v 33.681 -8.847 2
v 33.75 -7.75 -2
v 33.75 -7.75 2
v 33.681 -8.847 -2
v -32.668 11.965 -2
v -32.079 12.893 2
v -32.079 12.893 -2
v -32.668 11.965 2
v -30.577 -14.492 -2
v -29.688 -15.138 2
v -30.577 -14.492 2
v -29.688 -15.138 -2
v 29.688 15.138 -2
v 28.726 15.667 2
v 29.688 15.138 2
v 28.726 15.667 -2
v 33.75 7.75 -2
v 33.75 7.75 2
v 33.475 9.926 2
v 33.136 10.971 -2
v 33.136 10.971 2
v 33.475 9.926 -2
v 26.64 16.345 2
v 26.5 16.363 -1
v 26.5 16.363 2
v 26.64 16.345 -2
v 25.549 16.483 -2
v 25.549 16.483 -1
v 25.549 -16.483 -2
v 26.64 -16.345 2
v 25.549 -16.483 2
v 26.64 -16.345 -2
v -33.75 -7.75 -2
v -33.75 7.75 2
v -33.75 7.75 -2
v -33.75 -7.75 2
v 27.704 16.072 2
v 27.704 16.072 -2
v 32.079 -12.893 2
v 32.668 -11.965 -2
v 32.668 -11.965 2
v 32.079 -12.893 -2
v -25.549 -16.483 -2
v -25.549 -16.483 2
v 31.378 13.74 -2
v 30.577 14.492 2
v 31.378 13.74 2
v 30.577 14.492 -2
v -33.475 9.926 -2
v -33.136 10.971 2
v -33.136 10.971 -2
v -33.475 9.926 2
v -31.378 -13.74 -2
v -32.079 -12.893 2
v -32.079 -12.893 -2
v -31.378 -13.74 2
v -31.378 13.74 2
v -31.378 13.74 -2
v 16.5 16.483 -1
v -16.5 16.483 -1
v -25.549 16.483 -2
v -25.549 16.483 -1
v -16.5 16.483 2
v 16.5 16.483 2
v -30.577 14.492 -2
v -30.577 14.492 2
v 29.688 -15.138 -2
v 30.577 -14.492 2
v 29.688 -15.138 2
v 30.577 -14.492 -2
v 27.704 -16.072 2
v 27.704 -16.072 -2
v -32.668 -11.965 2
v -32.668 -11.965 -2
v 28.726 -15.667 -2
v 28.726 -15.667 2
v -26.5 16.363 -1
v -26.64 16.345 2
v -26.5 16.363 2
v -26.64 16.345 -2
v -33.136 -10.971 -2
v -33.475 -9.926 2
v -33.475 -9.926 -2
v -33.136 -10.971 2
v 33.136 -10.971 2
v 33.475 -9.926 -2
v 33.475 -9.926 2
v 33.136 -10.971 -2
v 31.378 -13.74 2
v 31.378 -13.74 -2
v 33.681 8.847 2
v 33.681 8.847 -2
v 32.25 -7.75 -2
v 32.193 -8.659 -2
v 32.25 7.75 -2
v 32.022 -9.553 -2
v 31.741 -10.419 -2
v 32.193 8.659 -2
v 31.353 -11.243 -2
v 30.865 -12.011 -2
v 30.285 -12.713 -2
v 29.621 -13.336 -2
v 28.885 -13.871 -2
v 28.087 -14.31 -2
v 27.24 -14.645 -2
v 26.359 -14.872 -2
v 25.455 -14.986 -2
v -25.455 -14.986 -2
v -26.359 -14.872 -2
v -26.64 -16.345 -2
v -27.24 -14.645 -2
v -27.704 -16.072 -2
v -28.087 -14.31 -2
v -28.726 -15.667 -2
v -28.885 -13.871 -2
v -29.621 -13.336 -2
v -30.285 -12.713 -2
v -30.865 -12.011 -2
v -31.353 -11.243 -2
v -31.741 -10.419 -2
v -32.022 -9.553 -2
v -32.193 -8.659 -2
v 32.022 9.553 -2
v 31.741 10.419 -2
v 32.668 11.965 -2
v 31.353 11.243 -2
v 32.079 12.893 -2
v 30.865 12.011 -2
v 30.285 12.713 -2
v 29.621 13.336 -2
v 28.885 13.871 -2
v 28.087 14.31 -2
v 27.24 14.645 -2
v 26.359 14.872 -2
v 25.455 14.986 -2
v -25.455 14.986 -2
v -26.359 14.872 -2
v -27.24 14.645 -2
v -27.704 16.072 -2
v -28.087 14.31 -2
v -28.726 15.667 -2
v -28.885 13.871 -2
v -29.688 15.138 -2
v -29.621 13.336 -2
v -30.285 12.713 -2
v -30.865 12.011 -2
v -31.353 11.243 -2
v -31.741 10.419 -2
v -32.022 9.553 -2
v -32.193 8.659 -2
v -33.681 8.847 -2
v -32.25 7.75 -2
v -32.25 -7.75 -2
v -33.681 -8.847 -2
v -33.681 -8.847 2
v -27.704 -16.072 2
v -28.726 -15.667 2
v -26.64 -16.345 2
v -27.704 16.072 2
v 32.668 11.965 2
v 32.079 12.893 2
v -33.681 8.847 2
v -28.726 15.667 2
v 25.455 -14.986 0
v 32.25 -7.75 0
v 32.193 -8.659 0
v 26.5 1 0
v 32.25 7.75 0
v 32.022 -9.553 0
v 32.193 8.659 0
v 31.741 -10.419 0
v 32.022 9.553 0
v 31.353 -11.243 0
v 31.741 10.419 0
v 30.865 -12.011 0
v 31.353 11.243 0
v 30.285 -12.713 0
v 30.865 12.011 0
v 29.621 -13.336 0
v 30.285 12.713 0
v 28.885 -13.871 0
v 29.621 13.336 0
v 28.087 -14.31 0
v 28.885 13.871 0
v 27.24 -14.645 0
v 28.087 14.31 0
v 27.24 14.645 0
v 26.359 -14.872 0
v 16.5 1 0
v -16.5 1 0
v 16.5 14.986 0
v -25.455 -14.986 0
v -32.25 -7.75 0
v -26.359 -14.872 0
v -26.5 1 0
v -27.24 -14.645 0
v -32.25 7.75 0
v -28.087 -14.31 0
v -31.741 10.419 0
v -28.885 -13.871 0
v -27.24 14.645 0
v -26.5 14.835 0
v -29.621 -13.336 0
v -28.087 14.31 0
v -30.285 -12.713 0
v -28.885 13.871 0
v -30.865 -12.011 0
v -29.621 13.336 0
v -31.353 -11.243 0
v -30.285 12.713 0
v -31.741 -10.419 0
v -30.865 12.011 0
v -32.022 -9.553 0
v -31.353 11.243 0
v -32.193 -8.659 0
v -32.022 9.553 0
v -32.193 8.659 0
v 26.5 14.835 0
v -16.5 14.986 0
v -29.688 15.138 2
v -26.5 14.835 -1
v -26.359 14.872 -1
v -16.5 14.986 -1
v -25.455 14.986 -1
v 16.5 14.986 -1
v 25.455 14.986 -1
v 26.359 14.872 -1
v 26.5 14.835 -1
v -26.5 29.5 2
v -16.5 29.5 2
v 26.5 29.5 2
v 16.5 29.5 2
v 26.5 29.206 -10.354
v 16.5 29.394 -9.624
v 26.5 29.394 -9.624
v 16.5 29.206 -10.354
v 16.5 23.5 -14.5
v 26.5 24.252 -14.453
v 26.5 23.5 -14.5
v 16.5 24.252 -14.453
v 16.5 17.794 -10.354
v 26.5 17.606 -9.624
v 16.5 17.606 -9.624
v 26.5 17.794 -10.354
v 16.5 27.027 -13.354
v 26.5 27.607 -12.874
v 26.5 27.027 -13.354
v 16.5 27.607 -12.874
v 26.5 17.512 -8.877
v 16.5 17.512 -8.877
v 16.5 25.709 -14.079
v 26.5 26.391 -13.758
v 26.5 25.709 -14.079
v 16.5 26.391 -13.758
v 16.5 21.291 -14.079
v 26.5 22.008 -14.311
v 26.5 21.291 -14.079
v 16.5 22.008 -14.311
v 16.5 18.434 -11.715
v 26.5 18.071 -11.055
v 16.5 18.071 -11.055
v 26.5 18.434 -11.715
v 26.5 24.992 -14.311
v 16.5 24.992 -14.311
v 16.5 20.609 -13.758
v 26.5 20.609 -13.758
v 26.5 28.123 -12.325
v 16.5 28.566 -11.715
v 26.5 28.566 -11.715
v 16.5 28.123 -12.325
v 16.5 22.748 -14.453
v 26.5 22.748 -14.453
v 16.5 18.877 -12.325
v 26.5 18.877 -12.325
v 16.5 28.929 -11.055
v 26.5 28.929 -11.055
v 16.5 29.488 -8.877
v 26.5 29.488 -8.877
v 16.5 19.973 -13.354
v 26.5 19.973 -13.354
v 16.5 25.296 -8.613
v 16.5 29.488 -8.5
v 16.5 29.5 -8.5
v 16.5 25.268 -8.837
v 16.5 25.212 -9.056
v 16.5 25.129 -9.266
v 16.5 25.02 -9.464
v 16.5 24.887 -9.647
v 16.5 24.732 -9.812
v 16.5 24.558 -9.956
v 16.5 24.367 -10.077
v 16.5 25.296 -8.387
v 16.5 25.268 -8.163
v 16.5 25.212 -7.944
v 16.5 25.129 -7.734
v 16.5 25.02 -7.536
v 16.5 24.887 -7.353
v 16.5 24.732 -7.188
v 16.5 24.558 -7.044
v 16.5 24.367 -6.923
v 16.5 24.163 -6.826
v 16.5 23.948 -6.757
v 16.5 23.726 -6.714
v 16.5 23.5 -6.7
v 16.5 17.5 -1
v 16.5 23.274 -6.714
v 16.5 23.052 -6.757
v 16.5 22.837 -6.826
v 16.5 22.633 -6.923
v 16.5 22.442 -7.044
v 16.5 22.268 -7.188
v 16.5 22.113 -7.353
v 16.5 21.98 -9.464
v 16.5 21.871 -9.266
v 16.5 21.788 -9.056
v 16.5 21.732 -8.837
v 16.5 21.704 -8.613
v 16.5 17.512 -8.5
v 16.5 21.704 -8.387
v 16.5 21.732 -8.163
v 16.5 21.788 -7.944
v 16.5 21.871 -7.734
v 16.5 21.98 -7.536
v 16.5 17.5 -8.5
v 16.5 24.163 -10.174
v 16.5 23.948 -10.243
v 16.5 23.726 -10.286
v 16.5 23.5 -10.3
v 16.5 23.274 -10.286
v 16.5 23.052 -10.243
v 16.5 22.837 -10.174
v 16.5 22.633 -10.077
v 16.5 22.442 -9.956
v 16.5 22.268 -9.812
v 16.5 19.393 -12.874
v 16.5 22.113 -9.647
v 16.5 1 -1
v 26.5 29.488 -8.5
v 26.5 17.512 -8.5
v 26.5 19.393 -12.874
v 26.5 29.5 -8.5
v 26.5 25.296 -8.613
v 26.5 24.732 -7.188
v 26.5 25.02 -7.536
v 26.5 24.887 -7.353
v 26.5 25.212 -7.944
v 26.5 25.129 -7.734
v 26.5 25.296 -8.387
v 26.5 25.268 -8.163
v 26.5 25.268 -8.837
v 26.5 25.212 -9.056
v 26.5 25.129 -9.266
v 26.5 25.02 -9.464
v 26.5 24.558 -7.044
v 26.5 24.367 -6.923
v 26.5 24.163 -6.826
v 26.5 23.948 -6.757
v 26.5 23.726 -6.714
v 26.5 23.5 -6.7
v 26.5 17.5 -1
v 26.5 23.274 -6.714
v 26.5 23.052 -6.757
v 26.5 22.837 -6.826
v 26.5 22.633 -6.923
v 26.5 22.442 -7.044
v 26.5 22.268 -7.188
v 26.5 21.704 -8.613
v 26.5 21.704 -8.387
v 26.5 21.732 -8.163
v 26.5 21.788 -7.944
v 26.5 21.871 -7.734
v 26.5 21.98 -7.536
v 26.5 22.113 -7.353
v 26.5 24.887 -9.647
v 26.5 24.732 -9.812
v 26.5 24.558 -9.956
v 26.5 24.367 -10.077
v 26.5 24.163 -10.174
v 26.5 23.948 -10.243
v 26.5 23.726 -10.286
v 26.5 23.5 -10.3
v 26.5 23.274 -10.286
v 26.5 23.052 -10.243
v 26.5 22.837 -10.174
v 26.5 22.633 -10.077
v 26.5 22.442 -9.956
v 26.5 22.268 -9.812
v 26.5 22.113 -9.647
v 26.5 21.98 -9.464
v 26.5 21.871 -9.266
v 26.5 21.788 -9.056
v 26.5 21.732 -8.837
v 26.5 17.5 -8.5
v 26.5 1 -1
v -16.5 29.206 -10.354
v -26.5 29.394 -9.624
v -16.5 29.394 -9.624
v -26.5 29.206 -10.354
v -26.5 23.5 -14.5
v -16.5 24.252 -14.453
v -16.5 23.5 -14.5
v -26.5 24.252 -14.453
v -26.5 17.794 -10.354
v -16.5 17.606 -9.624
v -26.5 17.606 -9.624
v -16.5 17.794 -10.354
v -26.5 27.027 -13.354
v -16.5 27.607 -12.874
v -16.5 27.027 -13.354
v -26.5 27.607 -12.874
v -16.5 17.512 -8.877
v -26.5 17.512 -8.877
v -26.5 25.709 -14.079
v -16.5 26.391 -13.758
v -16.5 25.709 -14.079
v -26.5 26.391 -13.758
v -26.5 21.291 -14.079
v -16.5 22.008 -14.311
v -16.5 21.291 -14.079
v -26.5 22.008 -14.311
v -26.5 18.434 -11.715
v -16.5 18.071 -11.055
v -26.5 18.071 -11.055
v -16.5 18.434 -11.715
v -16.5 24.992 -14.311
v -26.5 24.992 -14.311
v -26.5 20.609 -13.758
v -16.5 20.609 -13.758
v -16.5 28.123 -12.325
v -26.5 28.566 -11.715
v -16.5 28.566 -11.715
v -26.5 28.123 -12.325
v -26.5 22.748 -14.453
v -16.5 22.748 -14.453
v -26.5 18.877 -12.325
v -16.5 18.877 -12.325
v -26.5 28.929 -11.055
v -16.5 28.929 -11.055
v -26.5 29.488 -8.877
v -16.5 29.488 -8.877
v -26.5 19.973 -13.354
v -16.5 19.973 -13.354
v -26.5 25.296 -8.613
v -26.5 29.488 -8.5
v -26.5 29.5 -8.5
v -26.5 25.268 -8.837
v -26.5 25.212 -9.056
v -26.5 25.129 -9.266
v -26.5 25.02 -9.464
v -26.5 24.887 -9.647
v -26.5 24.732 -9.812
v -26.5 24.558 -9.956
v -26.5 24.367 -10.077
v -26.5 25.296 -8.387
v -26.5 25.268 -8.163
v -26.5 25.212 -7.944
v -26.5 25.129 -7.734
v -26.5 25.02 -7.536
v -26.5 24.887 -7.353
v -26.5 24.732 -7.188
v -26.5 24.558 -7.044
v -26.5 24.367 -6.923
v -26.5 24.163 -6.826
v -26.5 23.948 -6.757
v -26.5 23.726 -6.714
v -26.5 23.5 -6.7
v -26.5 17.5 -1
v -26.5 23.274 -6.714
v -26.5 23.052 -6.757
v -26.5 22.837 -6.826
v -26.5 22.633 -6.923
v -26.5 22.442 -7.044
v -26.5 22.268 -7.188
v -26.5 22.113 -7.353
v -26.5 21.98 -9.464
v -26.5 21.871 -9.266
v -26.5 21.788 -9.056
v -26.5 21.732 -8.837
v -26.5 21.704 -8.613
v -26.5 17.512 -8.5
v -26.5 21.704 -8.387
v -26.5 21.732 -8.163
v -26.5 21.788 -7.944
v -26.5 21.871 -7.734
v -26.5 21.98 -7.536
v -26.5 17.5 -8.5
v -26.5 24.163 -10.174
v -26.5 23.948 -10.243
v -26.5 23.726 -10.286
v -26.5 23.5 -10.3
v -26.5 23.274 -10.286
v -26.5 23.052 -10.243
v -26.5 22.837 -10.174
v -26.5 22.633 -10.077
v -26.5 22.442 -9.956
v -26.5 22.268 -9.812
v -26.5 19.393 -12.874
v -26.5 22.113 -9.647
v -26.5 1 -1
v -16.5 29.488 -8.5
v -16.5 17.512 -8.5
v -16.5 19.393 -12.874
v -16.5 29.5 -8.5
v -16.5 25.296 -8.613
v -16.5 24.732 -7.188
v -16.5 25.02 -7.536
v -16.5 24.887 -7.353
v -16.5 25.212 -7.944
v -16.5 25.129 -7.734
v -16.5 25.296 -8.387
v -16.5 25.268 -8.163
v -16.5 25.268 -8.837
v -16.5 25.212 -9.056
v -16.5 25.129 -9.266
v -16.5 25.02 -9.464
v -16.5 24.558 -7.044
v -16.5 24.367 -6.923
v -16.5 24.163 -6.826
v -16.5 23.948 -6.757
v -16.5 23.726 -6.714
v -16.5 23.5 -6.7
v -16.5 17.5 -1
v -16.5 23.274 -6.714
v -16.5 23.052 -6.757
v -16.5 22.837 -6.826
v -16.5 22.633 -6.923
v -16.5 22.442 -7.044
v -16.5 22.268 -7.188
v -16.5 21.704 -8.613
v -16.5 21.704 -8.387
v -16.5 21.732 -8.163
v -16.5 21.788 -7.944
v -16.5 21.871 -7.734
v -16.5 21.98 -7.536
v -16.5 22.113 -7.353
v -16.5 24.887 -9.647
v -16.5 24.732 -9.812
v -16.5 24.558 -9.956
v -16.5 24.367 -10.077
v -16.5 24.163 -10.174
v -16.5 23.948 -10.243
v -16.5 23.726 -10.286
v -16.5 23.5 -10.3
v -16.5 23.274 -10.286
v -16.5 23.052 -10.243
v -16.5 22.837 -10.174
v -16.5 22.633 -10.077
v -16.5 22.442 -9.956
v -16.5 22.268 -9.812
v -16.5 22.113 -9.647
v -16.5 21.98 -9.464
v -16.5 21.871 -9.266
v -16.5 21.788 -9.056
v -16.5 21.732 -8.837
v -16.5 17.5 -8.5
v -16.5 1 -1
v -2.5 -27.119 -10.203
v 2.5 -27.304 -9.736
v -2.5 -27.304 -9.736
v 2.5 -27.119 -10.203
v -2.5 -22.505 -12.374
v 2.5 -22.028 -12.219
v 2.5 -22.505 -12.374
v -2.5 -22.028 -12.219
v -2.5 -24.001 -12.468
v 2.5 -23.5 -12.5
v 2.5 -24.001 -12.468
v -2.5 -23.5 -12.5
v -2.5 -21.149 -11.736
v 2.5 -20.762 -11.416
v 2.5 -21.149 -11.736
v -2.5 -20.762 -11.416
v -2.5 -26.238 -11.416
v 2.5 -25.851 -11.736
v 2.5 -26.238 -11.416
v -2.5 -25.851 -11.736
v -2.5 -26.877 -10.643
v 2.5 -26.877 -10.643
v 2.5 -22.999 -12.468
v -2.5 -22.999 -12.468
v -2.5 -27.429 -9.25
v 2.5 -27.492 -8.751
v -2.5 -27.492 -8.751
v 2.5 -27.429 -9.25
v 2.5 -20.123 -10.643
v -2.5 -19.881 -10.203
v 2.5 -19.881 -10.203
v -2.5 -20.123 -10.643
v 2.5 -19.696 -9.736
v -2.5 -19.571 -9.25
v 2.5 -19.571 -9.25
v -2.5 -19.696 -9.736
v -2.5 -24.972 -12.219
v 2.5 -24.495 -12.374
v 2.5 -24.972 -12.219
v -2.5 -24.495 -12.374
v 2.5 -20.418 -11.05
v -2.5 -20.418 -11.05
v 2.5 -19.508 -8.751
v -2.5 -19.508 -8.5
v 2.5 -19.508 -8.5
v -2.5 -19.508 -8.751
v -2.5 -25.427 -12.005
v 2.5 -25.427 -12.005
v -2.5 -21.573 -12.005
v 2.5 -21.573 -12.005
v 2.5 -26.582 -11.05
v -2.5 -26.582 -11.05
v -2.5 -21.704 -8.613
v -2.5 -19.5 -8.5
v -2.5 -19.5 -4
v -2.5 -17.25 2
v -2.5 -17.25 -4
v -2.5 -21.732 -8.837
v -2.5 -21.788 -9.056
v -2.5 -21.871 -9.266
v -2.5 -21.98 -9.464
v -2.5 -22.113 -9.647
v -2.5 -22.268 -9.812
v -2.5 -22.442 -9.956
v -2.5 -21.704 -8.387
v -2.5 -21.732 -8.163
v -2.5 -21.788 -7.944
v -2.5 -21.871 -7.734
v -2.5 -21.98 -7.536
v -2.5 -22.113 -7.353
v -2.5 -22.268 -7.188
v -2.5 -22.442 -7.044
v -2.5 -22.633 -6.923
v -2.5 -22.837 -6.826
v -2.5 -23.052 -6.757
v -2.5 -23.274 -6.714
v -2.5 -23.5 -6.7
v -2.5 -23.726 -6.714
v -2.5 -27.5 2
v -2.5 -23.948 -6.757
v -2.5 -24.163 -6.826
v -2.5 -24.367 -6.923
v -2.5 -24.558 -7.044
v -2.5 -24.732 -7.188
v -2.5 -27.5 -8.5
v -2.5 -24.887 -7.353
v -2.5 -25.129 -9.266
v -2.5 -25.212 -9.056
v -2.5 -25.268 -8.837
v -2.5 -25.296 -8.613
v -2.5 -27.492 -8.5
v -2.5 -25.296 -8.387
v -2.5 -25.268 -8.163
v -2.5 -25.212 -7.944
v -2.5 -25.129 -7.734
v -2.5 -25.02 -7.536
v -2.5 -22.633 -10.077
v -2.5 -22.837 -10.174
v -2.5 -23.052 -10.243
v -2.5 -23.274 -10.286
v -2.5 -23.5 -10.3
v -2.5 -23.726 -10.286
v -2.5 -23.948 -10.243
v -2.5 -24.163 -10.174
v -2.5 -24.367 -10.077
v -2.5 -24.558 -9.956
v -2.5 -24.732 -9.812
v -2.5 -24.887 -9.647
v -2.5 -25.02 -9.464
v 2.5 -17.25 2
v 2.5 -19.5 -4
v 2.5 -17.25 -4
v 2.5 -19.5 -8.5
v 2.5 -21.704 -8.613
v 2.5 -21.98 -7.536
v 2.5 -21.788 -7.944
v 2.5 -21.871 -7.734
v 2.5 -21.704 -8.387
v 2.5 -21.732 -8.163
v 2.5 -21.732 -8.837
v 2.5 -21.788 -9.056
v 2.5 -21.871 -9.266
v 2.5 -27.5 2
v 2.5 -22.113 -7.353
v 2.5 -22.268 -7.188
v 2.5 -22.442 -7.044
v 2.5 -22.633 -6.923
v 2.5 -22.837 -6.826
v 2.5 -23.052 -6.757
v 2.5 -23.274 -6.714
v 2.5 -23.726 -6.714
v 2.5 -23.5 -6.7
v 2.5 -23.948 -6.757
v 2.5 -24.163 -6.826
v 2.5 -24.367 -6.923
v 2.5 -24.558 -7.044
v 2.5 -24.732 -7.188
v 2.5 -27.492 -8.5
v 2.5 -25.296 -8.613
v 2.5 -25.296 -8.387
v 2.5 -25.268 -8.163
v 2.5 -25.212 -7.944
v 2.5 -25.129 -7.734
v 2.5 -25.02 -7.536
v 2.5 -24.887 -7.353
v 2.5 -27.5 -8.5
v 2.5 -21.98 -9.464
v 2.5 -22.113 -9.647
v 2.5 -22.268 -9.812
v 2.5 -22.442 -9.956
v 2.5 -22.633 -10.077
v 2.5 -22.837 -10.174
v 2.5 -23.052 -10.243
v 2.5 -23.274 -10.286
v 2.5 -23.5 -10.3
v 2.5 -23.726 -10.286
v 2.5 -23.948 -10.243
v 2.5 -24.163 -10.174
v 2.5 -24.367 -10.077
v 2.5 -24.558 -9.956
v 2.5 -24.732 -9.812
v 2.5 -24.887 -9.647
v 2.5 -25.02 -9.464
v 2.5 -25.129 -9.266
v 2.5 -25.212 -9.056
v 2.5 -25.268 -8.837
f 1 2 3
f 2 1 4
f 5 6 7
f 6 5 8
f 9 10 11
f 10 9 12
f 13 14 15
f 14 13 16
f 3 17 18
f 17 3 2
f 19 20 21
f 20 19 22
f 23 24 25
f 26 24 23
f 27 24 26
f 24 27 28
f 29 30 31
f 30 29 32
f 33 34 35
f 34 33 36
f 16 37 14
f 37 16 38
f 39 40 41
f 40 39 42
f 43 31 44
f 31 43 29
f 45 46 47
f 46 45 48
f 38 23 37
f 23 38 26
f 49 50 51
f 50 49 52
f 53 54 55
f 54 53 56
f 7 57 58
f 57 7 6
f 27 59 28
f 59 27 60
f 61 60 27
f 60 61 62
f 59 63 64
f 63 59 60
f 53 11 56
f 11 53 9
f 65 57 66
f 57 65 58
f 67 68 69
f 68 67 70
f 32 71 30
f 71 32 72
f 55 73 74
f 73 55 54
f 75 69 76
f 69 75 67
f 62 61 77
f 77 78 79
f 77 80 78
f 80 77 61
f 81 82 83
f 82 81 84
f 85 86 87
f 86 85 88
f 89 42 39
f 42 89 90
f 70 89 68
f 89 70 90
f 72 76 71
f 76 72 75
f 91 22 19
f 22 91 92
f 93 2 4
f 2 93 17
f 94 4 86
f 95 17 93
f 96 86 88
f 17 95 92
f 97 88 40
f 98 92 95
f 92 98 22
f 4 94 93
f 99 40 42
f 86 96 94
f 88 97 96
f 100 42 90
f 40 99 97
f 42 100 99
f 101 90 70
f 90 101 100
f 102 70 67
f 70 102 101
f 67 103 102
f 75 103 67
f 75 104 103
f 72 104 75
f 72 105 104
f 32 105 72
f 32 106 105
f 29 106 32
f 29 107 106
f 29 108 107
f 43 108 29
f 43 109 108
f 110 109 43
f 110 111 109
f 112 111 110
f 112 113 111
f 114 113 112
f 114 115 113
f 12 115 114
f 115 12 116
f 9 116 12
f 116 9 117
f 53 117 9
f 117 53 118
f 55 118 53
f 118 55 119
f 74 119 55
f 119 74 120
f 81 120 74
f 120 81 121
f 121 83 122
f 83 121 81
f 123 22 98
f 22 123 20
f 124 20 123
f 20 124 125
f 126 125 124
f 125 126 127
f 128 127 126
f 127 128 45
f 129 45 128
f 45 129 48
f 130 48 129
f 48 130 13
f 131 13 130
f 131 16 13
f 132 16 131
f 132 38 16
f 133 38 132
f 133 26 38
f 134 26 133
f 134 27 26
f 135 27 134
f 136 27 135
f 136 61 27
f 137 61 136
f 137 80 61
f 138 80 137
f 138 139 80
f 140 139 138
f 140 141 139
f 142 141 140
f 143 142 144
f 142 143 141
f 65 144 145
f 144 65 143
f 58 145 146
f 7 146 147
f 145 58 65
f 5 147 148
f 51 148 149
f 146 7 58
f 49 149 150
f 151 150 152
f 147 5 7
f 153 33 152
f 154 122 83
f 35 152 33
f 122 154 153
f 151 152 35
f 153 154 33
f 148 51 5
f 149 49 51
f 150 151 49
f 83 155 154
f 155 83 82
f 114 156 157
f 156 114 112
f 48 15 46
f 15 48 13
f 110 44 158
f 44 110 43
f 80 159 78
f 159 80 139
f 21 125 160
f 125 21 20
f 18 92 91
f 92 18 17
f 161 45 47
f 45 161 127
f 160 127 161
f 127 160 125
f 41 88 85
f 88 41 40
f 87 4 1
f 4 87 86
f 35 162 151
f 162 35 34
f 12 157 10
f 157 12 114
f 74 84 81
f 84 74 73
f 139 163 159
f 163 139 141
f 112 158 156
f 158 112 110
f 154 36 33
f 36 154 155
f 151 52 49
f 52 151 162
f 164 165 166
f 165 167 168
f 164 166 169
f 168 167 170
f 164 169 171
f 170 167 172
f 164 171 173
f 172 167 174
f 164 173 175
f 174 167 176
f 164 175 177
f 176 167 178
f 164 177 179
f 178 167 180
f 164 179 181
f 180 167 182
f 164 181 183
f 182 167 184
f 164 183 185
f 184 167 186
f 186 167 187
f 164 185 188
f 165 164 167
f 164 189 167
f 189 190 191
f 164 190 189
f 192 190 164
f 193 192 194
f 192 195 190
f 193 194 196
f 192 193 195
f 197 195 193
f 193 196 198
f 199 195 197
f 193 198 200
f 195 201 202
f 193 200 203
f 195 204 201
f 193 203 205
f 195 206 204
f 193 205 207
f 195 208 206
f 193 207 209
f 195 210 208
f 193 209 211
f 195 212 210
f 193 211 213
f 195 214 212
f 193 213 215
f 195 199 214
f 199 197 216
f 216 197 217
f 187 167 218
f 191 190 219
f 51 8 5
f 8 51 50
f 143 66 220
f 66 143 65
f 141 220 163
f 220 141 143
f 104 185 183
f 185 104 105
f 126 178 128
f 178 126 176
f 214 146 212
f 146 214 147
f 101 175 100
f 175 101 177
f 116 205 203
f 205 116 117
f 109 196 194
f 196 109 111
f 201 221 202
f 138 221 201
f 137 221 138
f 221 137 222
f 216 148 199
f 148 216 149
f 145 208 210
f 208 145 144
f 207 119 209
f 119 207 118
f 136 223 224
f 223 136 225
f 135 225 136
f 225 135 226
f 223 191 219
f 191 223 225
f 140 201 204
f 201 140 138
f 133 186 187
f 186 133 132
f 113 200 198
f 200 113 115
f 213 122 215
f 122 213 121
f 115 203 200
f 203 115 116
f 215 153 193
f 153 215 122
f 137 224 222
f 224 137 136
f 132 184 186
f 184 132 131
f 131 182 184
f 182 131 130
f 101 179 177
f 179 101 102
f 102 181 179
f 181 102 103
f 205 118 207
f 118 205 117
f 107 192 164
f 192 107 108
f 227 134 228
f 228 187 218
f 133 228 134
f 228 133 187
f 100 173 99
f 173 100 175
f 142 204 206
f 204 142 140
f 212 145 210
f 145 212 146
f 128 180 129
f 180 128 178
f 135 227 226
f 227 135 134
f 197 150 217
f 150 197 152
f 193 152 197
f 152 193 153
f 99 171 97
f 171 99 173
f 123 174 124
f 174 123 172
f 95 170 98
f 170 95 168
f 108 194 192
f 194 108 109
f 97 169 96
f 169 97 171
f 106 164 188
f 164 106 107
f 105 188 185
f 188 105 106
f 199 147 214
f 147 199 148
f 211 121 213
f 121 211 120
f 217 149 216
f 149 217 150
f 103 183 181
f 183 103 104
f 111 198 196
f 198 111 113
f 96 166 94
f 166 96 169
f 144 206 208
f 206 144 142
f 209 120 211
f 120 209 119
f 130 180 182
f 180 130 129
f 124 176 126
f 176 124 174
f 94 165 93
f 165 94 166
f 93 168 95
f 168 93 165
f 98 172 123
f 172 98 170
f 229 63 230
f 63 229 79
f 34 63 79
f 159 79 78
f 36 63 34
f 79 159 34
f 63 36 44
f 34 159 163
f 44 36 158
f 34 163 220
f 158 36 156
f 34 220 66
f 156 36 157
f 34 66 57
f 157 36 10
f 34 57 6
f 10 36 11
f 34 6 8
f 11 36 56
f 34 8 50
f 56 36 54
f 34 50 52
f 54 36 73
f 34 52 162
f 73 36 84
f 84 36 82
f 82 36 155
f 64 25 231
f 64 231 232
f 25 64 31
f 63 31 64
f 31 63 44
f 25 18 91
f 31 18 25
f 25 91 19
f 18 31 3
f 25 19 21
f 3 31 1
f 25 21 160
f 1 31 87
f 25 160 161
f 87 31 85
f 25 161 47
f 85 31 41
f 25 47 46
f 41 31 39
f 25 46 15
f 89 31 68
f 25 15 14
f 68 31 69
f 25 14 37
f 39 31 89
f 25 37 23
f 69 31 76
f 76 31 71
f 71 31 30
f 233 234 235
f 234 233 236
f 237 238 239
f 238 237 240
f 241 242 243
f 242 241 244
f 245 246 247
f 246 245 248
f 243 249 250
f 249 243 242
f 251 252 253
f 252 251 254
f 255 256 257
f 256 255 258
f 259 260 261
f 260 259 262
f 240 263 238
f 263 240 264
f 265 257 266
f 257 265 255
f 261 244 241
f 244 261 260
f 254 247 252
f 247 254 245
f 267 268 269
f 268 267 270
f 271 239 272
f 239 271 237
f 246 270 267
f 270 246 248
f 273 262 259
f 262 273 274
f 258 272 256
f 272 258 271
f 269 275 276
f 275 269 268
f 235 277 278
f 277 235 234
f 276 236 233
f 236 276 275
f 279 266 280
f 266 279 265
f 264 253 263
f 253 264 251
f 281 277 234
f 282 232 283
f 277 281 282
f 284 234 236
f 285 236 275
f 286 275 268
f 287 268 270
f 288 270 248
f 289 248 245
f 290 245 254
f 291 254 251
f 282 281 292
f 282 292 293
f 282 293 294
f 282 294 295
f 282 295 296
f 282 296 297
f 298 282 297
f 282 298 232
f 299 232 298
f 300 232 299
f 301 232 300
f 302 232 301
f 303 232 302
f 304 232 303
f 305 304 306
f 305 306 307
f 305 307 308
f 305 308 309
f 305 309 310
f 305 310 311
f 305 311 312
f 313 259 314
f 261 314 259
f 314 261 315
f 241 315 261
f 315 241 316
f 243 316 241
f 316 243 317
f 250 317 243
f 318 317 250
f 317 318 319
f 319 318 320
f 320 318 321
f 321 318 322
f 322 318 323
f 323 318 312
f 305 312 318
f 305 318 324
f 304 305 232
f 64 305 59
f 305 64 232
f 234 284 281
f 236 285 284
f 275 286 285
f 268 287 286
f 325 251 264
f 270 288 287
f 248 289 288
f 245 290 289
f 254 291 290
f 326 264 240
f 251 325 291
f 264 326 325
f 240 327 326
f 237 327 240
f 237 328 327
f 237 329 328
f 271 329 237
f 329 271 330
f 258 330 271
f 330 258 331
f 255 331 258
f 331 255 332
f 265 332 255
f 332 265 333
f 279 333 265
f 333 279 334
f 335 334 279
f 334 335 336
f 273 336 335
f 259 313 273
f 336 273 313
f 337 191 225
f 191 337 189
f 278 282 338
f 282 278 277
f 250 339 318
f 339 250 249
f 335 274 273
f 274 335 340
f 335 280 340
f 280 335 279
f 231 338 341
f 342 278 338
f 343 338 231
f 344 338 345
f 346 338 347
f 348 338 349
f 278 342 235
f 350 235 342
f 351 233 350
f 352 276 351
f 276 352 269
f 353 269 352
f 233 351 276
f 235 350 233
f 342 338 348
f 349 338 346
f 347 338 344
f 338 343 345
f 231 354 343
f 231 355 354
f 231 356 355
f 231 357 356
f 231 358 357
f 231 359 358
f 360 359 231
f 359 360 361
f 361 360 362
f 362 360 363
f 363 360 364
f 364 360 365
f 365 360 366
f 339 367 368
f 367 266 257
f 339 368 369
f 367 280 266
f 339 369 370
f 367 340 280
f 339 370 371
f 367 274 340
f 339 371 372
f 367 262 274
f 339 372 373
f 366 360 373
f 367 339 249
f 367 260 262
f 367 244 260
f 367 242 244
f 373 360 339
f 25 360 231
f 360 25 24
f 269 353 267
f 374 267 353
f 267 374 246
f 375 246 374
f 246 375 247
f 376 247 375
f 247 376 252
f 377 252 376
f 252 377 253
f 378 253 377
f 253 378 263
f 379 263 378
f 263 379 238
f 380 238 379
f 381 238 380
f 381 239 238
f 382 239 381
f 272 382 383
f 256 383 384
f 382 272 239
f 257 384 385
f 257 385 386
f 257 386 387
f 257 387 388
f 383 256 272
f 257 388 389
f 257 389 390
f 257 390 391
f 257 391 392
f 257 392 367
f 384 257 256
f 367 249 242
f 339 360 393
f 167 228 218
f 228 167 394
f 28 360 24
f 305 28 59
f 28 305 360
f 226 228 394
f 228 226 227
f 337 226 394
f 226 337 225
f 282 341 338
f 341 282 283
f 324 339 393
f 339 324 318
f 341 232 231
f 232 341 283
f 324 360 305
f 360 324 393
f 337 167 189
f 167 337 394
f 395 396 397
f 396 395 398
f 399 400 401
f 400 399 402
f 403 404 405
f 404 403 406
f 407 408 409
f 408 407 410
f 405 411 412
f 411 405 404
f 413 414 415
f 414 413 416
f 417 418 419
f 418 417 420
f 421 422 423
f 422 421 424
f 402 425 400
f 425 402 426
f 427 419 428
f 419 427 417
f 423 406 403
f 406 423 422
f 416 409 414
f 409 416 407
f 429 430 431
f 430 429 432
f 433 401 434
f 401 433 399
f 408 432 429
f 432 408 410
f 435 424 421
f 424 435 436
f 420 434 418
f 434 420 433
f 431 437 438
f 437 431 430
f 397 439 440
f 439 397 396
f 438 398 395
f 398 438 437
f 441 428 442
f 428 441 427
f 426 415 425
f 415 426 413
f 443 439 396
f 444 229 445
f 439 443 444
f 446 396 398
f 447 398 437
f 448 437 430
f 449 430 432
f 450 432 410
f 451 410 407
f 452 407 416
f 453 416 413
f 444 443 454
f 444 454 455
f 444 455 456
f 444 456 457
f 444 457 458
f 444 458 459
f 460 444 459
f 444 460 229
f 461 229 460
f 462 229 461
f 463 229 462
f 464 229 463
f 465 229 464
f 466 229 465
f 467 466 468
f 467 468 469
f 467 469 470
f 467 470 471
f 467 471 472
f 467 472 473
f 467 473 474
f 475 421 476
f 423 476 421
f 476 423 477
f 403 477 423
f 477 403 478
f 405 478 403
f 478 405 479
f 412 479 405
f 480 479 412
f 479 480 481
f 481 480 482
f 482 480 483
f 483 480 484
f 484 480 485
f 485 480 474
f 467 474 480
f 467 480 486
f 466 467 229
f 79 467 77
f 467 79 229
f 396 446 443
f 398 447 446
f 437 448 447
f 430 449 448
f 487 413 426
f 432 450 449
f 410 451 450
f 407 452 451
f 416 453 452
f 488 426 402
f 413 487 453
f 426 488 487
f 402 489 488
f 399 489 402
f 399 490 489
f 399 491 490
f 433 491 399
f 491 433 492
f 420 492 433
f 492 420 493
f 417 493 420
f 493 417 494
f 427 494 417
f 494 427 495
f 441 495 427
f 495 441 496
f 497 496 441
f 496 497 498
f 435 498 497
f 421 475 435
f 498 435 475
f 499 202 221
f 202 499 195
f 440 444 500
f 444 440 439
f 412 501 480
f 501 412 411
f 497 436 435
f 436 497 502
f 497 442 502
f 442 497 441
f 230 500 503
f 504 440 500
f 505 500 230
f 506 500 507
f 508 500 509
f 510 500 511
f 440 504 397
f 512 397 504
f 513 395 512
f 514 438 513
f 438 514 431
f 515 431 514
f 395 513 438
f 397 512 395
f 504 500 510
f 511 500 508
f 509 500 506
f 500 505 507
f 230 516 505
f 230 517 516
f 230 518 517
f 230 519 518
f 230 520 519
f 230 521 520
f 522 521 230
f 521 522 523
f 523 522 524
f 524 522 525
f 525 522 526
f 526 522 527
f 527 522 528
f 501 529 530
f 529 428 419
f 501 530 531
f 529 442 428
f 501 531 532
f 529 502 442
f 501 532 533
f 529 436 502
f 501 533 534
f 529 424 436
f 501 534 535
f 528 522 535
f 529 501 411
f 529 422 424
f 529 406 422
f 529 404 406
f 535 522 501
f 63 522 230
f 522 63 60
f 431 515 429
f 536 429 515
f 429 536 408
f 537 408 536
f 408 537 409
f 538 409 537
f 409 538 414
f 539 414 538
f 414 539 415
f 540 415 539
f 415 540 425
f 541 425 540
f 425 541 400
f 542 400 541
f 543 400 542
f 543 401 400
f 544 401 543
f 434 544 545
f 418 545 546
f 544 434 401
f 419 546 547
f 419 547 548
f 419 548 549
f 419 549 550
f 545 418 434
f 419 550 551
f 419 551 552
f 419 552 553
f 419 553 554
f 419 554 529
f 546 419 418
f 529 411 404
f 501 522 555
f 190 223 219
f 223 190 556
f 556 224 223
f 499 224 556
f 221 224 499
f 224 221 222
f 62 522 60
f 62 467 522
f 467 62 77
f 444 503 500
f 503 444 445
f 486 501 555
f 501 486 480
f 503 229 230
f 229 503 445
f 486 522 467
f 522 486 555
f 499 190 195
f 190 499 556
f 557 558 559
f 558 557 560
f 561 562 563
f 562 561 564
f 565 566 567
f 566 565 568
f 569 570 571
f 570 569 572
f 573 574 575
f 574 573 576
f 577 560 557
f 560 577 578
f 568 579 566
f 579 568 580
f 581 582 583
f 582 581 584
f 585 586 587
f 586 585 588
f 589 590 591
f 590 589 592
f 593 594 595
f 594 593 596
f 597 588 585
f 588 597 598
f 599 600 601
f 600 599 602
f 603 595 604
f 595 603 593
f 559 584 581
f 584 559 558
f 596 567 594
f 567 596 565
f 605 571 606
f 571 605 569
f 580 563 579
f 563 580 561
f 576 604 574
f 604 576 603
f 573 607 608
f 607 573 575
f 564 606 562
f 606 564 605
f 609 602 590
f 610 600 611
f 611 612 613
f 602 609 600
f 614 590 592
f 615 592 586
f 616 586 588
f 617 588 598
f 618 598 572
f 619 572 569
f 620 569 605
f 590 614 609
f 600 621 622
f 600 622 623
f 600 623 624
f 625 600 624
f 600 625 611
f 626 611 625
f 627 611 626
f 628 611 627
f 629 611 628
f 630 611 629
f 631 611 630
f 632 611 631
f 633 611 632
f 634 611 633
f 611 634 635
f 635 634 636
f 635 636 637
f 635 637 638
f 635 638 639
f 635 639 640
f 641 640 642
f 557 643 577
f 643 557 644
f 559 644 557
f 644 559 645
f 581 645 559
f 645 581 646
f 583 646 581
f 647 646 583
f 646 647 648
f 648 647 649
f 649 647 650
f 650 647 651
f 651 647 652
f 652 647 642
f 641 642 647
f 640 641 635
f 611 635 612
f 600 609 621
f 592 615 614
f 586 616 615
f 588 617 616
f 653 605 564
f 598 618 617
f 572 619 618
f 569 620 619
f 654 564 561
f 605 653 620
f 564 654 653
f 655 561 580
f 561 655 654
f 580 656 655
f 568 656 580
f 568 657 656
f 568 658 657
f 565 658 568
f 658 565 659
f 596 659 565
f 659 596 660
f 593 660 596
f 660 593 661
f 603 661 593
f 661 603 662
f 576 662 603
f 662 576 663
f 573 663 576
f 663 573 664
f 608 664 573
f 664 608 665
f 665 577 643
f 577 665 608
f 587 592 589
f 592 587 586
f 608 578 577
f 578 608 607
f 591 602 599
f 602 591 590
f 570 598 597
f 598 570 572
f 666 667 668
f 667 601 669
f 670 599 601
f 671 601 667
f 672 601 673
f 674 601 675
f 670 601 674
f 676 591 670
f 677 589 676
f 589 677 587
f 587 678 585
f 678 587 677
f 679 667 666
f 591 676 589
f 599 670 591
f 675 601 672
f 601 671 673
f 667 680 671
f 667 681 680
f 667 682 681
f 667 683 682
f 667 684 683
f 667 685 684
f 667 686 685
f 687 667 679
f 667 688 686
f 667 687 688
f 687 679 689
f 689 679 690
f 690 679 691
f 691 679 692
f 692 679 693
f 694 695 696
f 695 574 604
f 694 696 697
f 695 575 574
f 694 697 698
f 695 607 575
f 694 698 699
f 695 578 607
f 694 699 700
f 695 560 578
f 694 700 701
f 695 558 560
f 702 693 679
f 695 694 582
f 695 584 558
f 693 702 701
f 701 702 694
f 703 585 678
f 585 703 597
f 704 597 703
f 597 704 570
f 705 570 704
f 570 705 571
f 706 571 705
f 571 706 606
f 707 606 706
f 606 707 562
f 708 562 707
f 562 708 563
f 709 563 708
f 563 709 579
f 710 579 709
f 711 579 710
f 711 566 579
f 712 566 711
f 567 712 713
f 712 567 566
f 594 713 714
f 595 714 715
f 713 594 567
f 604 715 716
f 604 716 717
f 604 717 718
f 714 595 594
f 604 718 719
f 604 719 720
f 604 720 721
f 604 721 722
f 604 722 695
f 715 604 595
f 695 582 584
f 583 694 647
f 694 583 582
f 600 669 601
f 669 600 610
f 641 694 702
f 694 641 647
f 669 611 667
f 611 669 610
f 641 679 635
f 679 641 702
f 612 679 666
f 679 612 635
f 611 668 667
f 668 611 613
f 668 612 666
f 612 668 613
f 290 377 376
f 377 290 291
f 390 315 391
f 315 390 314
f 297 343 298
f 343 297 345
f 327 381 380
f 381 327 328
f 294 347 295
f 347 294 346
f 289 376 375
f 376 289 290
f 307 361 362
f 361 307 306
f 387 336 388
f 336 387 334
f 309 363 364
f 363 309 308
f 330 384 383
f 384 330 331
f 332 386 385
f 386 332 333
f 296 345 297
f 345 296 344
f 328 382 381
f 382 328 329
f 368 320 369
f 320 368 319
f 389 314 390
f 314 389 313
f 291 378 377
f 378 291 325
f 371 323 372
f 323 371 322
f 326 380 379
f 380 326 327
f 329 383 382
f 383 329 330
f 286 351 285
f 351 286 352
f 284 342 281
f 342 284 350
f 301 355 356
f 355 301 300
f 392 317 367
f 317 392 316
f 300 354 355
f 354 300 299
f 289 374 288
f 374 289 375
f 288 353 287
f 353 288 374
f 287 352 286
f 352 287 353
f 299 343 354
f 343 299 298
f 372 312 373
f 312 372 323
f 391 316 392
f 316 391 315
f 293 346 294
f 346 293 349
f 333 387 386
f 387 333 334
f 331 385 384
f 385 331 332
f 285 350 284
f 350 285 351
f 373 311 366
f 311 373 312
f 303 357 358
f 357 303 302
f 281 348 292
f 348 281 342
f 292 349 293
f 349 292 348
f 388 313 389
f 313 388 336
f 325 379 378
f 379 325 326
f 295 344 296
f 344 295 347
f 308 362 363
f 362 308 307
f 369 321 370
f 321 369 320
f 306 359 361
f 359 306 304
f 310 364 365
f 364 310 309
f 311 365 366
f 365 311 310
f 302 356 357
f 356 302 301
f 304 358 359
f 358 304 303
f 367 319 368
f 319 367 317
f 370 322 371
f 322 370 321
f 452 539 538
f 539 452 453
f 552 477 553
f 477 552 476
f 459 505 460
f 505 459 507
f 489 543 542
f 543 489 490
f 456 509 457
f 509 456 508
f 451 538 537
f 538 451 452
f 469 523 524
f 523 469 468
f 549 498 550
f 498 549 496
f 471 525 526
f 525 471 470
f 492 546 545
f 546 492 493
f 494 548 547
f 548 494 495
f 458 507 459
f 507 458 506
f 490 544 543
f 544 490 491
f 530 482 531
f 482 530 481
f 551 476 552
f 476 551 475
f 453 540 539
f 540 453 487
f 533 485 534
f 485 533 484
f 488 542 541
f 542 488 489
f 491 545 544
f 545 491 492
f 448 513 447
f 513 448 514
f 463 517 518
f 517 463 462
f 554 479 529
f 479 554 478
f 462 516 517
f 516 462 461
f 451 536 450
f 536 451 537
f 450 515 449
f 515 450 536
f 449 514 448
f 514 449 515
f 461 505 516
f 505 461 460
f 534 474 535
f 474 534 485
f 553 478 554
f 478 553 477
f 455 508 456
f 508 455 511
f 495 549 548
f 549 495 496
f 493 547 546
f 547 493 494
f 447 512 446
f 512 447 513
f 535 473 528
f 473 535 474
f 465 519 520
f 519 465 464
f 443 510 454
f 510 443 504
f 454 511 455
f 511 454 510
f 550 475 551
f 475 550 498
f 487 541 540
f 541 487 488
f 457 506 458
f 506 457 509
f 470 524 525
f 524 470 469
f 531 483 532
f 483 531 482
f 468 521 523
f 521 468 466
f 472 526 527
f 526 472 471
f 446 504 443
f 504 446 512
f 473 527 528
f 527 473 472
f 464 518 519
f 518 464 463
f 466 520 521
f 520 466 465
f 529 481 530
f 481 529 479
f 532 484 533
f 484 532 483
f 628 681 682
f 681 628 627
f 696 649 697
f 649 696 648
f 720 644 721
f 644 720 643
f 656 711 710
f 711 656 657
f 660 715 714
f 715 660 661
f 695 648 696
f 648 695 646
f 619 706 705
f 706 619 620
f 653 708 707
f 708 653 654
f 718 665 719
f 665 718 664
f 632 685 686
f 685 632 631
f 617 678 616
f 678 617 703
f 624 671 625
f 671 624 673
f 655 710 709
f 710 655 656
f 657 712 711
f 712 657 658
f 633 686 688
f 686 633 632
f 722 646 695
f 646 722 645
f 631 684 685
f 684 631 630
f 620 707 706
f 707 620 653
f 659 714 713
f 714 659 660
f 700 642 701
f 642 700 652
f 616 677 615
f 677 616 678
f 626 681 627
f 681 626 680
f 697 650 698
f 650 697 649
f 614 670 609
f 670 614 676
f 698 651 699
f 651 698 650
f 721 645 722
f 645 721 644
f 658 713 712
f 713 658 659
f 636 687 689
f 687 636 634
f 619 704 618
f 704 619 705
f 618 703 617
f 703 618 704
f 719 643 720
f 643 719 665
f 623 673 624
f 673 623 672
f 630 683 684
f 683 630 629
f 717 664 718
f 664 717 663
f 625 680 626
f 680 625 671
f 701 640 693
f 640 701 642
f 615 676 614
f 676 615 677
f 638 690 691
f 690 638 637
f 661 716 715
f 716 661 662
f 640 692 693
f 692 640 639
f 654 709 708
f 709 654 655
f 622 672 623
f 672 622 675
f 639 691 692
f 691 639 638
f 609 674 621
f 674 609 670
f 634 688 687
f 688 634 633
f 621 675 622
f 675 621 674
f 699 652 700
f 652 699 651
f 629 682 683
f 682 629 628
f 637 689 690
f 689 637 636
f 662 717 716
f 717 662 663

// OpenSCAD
$fn = 50;


difference() {
	union() {
		translate(v = [0, 0, -2.0000000000]) {
			rotate(a = [0, 0, 0]) {
				difference() {
					union() {
						hull() {
							translate(v = [-25.0000000000, 7.7500000000, 0]) {
								cylinder(h = 2, r = 8.7500000000);
							}
							translate(v = [25.0000000000, 7.7500000000, 0]) {
								cylinder(h = 2, r = 8.7500000000);
							}
							translate(v = [-25.0000000000, -7.7500000000, 0]) {
								cylinder(h = 2, r = 8.7500000000);
							}
							translate(v = [25.0000000000, -7.7500000000, 0]) {
								cylinder(h = 2, r = 8.7500000000);
							}
						}
					}
					union() {
						hull() {
							translate(v = [-25.0000000000, 7.7500000000, 0]) {
								cylinder(h = 2, r = 7.2500000000);
							}
							translate(v = [25.0000000000, 7.7500000000, 0]) {
								cylinder(h = 2, r = 7.2500000000);
							}
							translate(v = [-25.0000000000, -7.7500000000, 0]) {
								cylinder(h = 2, r = 7.2500000000);
							}
							translate(v = [25.0000000000, -7.7500000000, 0]) {
								cylinder(h = 2, r = 7.2500000000);
							}
						}
					}
				}
			}
		}
		hull() {
			translate(v = [-25.0000000000, 7.7500000000, 0]) {
				cylinder(h = 2, r = 8.7500000000);
			}
			translate(v = [25.0000000000, 7.7500000000, 0]) {
				cylinder(h = 2, r = 8.7500000000);
			}
			translate(v = [-25.0000000000, -7.7500000000, 0]) {
				cylinder(h = 2, r = 8.7500000000);
			}
			translate(v = [25.0000000000, -7.7500000000, 0]) {
				cylinder(h = 2, r = 8.7500000000);
			}
		}
		translate(v = [16.5000000000, 23.5000000000, -8.5000000000]) {
			rotate(a = [0, 90, 0]) {
				cylinder(h = 10, r = 6.0000000000);
			}
		}
		translate(v = [16.5000000000, 17.5000000000, -8.5000000000]) {
			cube(size = [10, 12, 7.5000000000]);
		}
		translate(v = [16.5000000000, 1.0000000000, -1.0000000000]) {
			cube(size = [10, 28.5000000000, 3]);
		}
		translate(v = [-26.5000000000, 23.5000000000, -8.5000000000]) {
			rotate(a = [0, 90, 0]) {
				cylinder(h = 10, r = 6.0000000000);
			}
		}
		translate(v = [-26.5000000000, 17.5000000000, -8.5000000000]) {
			cube(size = [10, 12, 7.5000000000]);
		}
		translate(v = [-26.5000000000, 1.0000000000, -1.0000000000]) {
			cube(size = [10, 28.5000000000, 3]);
		}
		translate(v = [-2.5000000000, -23.5000000000, -8.5000000000]) {
			rotate(a = [0, 90, 0]) {
				cylinder(h = 5, r = 4.0000000000);
			}
		}
		translate(v = [-2.5000000000, -27.5000000000, -8.5000000000]) {
			cube(size = [5, 8, 7.5000000000]);
		}
		translate(v = [-2.5000000000, -27.5000000000, -4.0000000000]) {
			cube(size = [5, 10.2500000000, 6]);
		}
	}
	union() {
		translate(v = [16.5000000000, 23.5000000000, -8.5000000000]) {
			rotate(a = [0, 90, 0]) {
				cylinder(h = 10, r = 1.8000000000);
			}
		}
		translate(v = [-26.5000000000, 23.5000000000, -8.5000000000]) {
			rotate(a = [0, 90, 0]) {
				cylinder(h = 10, r = 1.8000000000);
			}
		}
		translate(v = [-5.0000000000, -23.5000000000, -8.5000000000]) {
			rotate(a = [0, 90, 0]) {
				cylinder(h = 10, r = 1.8000000000);
			}
		}
	}
}
